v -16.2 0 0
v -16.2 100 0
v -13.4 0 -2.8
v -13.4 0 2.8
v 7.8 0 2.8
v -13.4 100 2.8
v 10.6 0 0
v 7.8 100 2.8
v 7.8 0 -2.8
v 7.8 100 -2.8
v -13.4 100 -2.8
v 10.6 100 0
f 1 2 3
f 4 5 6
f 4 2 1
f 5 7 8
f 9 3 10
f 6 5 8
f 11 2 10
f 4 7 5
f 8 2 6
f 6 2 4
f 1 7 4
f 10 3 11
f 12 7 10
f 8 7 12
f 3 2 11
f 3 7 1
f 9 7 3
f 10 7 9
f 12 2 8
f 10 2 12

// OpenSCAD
$fn = 90;

r1 = 19/2;
r2 = 21.2/2;
h1 = 2.74;
h2 = 4.17;

side = (h1/2 + (h2 - h1)) * sqrt(2);

L = 100;

module nato_rail() {
    hull() for(s=[1,-1])
        translate([s*r2,0,0]) rotate([0,45-180,0])
            cube([side,L,side]);
    
}


nato_rail();
